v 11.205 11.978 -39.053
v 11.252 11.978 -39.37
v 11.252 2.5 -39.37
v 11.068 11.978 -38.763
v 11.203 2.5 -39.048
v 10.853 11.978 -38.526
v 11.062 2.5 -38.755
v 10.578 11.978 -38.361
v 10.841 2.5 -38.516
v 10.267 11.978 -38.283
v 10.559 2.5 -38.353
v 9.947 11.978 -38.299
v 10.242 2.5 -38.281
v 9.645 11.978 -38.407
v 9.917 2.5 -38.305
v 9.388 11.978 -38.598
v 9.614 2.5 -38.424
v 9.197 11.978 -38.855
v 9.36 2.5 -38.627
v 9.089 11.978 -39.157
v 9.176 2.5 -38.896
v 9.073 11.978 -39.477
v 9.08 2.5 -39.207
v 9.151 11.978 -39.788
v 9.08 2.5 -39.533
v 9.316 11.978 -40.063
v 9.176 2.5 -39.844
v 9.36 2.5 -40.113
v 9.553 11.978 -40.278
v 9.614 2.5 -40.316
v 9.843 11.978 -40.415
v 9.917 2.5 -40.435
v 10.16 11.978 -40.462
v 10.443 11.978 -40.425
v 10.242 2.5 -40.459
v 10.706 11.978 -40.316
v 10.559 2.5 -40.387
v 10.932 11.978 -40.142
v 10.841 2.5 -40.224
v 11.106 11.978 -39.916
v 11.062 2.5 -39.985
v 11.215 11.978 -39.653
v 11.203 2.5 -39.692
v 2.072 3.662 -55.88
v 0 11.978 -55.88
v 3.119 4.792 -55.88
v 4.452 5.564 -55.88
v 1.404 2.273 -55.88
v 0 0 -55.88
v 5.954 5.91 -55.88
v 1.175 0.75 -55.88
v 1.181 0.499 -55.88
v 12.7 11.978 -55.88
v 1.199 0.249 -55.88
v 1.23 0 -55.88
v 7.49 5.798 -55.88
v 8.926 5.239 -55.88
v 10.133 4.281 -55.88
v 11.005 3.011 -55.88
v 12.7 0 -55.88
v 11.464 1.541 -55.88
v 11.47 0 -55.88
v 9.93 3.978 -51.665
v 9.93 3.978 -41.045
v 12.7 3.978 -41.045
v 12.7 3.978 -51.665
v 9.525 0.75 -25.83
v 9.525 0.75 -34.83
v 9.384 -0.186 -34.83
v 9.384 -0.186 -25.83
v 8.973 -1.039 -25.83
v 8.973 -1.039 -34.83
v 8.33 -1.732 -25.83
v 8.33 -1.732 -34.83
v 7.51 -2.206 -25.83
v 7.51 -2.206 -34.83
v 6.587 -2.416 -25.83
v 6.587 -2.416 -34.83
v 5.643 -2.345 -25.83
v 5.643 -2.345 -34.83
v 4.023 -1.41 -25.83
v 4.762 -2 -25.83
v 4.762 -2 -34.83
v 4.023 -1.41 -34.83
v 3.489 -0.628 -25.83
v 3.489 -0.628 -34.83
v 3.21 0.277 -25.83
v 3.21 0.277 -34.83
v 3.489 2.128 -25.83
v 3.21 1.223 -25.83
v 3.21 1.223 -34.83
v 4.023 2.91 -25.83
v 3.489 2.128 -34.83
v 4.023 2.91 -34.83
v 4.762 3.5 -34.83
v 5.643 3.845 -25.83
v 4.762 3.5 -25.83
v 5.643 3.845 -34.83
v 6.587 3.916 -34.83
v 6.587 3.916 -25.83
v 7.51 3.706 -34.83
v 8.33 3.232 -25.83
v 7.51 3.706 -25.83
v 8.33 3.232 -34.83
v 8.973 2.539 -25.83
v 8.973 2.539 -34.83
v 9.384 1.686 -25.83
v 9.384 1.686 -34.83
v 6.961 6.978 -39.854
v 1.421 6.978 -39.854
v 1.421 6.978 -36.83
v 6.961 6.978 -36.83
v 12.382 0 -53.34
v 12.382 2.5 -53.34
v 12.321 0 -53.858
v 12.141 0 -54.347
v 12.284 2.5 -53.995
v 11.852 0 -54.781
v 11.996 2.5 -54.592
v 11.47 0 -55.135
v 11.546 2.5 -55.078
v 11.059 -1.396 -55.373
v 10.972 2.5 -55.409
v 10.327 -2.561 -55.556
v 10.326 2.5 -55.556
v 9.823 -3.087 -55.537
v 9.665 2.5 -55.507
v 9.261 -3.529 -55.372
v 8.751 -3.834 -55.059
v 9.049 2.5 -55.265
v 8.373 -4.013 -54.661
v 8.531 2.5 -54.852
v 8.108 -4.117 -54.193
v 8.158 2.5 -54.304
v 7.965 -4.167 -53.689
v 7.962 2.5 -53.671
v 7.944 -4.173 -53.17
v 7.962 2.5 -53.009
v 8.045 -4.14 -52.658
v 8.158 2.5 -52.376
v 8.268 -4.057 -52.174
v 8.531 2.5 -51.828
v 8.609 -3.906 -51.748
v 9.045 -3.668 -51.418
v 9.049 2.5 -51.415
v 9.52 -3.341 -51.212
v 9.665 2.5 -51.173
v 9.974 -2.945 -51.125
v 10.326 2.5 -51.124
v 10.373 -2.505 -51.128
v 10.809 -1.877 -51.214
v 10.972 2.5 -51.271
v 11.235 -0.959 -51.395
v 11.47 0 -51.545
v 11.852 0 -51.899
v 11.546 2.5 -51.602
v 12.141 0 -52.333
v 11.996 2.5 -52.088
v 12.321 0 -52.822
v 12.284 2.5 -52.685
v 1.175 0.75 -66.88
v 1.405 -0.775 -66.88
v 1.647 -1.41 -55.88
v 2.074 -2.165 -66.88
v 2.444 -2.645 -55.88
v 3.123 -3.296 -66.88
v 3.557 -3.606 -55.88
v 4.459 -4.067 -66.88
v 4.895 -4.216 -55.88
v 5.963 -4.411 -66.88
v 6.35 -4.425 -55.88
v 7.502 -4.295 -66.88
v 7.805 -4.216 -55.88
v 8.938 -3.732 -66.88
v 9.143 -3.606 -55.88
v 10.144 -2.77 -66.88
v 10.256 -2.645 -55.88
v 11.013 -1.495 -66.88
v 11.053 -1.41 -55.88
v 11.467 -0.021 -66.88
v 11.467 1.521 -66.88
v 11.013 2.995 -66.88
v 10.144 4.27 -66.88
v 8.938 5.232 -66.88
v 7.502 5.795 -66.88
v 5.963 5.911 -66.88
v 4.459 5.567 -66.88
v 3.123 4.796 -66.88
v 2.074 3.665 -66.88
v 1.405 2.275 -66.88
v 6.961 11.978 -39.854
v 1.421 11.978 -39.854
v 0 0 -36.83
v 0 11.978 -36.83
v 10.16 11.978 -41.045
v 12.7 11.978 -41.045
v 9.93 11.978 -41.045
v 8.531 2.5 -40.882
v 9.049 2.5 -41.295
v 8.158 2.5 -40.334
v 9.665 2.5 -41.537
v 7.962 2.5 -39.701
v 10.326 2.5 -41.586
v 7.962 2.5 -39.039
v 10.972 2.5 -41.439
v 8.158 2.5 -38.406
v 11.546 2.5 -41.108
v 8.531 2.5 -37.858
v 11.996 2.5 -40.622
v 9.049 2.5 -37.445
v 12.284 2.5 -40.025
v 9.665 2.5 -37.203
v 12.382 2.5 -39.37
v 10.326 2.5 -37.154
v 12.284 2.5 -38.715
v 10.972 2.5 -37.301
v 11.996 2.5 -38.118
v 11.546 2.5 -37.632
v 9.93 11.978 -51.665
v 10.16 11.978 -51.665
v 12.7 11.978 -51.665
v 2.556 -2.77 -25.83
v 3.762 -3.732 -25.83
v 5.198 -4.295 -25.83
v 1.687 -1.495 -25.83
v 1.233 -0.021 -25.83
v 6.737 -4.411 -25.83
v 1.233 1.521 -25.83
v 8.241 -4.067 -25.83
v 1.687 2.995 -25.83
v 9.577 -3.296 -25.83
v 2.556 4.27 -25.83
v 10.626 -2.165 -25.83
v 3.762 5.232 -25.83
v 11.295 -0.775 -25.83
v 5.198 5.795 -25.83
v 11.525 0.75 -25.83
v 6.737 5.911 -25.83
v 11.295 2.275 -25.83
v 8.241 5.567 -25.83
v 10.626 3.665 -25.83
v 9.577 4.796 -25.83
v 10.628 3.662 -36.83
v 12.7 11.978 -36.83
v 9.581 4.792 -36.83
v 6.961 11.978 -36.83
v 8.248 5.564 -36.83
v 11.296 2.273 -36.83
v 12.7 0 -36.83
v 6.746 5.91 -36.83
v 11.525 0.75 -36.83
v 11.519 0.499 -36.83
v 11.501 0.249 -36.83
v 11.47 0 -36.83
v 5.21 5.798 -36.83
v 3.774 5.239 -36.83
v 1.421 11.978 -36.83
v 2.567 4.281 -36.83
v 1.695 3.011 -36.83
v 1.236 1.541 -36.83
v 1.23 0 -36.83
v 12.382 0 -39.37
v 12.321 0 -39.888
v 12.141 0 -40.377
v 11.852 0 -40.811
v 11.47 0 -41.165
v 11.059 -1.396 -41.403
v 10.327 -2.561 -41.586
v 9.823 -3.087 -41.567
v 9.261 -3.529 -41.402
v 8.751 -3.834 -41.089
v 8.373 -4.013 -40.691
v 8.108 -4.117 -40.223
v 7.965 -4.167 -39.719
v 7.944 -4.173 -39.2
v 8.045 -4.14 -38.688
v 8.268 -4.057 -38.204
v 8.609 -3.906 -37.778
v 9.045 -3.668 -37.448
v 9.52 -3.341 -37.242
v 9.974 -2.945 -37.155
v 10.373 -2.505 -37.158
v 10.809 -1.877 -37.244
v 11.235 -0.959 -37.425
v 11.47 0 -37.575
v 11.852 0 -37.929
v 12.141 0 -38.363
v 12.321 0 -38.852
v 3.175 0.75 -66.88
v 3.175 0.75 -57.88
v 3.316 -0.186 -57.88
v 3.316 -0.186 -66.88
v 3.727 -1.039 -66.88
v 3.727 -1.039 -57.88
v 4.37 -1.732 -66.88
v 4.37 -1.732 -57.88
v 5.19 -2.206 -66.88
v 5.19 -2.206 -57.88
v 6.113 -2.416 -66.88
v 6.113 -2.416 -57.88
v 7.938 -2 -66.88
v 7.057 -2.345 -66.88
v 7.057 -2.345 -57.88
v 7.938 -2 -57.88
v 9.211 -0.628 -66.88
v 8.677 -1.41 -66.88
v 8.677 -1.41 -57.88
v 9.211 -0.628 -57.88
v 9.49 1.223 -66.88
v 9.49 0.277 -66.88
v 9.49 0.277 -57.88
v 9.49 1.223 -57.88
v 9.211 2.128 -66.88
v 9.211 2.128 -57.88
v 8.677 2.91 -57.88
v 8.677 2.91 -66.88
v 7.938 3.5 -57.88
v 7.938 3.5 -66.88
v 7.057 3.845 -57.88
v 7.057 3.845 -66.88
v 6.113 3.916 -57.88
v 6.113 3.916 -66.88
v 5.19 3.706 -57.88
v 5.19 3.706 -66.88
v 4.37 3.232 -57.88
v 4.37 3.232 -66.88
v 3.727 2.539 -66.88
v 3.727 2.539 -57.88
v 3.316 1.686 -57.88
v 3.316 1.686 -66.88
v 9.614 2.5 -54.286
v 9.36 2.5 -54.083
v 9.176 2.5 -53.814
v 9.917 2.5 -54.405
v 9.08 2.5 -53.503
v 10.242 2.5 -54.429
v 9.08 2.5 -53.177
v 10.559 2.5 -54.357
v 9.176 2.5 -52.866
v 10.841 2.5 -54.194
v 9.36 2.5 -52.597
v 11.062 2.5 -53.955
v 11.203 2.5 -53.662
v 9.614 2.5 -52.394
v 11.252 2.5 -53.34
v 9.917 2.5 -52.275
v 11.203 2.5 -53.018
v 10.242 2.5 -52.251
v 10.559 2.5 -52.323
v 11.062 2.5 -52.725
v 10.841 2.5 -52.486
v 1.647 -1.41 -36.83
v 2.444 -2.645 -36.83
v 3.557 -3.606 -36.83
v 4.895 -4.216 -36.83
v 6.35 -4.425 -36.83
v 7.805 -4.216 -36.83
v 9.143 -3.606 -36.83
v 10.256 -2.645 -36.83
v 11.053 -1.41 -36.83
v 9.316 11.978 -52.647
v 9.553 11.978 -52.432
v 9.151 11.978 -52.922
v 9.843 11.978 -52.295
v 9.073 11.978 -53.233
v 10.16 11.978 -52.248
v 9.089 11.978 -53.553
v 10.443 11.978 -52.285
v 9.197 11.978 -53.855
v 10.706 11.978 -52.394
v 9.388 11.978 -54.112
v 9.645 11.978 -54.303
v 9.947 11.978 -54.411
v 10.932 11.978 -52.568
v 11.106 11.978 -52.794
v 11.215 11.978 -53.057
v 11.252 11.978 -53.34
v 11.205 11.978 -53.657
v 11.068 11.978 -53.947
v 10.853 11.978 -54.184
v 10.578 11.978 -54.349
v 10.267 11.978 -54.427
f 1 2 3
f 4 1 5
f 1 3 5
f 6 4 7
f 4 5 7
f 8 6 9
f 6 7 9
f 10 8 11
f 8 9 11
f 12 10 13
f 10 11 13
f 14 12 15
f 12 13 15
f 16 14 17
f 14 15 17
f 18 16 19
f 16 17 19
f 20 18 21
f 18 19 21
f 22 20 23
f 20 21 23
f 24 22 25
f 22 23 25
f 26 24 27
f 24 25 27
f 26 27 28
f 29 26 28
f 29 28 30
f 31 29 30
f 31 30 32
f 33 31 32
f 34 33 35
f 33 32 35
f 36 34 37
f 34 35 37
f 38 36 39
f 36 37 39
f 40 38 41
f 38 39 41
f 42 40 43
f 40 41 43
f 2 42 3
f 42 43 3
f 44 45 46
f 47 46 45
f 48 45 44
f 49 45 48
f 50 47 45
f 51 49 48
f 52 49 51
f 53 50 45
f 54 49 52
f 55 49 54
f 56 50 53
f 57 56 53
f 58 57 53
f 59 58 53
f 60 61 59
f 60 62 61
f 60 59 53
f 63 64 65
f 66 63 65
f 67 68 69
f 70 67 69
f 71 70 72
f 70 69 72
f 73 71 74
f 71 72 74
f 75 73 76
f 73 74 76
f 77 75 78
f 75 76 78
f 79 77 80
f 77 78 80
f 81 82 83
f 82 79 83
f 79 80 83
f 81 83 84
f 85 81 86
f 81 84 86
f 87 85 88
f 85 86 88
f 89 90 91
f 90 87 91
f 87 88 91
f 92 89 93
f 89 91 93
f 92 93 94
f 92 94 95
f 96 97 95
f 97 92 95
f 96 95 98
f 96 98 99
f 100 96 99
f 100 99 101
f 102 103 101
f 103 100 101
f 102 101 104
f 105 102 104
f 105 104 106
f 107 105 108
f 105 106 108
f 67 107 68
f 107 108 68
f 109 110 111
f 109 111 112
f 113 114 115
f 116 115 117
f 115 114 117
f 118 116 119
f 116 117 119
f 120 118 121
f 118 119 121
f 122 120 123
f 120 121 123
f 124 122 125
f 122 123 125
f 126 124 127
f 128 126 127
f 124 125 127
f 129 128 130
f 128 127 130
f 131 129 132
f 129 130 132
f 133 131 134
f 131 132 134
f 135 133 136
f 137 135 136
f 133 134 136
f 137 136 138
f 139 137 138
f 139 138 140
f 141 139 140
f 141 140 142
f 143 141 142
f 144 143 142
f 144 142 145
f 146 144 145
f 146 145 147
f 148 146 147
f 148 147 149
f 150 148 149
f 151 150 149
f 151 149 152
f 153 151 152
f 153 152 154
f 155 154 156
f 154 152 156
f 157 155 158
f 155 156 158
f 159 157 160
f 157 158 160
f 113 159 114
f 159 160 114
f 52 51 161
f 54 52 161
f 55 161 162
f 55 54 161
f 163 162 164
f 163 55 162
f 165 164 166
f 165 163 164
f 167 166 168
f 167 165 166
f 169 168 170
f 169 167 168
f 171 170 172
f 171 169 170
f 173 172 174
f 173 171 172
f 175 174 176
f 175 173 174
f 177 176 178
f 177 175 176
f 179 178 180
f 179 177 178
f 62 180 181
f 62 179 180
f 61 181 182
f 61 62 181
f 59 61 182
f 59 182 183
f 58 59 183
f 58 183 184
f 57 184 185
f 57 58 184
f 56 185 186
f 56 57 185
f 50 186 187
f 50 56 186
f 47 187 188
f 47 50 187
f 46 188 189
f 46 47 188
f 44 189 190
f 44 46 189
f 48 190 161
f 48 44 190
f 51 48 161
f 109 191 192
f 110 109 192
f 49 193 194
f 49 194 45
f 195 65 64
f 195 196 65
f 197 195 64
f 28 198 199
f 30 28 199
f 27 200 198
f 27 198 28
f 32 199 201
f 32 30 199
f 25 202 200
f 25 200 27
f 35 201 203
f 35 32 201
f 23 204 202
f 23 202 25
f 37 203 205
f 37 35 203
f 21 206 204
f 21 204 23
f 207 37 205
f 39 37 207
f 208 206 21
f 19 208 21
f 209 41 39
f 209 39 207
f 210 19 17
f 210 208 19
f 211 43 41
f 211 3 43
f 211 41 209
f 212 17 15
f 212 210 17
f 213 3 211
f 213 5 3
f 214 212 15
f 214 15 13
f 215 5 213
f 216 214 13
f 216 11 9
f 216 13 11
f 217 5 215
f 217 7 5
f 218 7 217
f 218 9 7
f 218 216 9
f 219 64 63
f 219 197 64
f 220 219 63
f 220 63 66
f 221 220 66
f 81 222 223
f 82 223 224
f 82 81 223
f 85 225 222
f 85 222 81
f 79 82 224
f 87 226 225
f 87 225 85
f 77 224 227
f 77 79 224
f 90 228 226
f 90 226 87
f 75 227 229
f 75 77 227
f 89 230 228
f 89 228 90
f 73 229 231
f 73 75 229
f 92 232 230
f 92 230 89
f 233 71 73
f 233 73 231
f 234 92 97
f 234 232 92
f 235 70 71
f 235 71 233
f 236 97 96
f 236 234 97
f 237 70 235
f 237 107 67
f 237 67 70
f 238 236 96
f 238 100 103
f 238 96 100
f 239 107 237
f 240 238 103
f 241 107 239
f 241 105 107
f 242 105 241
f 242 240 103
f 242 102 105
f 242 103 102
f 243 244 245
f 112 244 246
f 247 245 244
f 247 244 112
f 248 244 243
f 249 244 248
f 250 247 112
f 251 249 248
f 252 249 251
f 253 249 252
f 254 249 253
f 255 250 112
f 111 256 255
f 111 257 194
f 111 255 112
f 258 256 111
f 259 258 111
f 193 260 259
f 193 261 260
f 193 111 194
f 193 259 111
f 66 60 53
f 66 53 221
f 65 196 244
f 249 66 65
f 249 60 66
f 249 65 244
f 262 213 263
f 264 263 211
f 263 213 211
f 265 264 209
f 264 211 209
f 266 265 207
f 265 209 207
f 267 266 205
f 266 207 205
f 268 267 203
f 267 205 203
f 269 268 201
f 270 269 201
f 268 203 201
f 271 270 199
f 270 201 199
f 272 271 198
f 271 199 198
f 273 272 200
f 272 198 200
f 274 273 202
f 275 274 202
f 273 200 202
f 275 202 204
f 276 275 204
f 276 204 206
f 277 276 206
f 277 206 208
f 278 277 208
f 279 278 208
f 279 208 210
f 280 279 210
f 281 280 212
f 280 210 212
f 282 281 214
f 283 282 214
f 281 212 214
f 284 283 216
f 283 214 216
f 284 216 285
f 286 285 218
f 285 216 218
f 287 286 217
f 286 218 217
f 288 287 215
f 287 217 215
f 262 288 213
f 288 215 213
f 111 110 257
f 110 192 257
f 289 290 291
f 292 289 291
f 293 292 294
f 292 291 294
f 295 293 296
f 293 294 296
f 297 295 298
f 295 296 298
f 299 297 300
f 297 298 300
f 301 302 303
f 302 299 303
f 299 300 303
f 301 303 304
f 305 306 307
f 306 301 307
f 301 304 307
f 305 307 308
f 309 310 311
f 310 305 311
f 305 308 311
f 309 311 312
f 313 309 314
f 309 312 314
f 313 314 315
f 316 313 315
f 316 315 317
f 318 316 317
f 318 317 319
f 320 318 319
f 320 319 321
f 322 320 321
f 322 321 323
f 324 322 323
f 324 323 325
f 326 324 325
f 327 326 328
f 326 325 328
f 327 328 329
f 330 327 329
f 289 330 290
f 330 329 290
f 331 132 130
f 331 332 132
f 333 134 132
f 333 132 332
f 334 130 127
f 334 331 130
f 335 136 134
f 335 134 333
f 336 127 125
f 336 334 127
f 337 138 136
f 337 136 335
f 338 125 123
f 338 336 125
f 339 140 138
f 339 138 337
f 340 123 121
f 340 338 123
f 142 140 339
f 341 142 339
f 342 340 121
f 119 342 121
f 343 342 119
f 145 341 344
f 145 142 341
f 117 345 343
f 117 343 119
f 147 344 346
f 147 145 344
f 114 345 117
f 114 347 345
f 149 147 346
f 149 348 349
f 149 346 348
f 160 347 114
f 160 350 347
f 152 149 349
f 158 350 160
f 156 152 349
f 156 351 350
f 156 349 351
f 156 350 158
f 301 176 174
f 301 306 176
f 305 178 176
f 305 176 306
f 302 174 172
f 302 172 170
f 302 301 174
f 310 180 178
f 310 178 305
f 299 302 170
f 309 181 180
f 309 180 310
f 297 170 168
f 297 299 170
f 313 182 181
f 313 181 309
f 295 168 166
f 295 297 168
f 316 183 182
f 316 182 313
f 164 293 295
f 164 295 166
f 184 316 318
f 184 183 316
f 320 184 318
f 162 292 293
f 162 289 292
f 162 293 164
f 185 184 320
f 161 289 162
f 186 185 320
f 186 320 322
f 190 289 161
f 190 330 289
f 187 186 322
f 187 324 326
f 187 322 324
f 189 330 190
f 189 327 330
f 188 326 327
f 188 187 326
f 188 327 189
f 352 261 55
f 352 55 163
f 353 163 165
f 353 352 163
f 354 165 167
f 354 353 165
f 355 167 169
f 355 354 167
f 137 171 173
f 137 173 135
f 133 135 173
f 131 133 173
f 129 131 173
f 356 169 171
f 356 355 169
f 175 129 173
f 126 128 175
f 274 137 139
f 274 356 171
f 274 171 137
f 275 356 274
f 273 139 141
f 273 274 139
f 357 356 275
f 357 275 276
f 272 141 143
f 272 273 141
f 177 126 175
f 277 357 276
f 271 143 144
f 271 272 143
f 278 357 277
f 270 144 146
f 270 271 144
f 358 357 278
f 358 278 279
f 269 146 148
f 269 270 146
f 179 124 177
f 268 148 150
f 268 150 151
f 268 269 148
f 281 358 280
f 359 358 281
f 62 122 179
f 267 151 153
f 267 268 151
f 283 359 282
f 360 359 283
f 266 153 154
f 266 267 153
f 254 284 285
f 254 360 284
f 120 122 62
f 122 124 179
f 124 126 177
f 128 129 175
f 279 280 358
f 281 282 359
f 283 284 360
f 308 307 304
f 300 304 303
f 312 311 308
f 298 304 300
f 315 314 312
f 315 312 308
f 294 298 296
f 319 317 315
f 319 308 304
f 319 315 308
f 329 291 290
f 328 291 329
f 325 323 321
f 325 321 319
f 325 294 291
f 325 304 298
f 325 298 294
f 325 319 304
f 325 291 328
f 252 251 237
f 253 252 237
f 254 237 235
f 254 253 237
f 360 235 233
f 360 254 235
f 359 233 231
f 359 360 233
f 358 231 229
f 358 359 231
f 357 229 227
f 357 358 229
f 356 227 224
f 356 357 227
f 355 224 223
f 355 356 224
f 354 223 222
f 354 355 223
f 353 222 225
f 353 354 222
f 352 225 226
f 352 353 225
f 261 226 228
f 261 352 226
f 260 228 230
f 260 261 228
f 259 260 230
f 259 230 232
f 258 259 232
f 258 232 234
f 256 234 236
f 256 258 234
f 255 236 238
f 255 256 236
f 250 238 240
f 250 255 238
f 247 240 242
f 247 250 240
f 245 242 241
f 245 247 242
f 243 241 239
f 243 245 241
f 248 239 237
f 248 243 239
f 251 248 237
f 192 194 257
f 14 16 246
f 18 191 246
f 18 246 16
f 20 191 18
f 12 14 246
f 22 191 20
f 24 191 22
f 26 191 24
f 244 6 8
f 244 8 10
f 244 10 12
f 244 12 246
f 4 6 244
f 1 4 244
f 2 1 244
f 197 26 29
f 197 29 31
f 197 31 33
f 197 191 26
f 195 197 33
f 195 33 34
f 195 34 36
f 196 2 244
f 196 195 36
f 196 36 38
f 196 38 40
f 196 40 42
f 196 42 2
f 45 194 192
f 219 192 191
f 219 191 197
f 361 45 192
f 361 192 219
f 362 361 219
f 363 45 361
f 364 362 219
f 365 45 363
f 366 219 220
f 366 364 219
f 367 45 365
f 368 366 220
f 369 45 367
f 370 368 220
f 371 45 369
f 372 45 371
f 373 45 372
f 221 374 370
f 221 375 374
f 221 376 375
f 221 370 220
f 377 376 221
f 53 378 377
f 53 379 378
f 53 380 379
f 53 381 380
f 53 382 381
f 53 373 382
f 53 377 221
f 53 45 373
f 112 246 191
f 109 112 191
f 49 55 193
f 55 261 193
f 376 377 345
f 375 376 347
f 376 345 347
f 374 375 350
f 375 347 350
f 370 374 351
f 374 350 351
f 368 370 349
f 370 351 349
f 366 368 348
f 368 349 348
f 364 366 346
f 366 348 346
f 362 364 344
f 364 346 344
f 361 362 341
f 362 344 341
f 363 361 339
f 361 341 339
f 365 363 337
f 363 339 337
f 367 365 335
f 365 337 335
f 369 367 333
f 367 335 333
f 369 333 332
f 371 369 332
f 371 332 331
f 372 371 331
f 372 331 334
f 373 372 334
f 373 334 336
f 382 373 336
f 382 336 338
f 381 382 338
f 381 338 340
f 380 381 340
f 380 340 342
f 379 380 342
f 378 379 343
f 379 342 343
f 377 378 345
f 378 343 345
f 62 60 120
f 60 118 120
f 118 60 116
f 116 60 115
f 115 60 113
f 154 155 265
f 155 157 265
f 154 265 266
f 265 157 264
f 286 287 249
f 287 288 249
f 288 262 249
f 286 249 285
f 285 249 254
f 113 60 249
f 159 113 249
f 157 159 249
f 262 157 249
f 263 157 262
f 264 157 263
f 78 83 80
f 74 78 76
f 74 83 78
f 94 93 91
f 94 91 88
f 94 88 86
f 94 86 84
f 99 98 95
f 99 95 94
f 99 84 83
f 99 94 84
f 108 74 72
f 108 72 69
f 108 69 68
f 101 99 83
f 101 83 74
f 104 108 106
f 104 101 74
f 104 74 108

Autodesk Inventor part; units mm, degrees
ref_plane "YZ Plane" through (0, 0, 0) normal (1, 0, 0) x (0, 1, 0)
ref_plane "XZ Plane" through (0, 0, 0) normal (0, 1, 0) x (-1, 0, 0)
ref_plane "XY Plane" through (0, 0, 0) normal (0, 0, 1) x (1, 0, 0)
sketch "Sketch1" plane through (0, 0, 0) normal (0, 1, 0) x (-1, 0, 0)
  line L0 (0, -55.88) -> (-12.7, -55.88)
  line L1 (-12.7, -36.83) -> (0, -36.83)
  line L2 (0, -36.83) -> (0, -55.88)
  line L3 (-12.7, -55.88) -> (-12.7, -36.83)
  dimension "d1" = 19.05
  dimension "d2" = 12.7
extrude "Extrusion1" add sketch "Sketch1" along normal blind 1.5
sketch "Sketch2" plane through (0, 1.5, 0) normal (0, 1, 0) x (1, 0, 0)
  line L0 (12.7, 36.83) -> (12.7, 55.88) projected
  line L1 (12.7, 0) -> (10.16, 0)
  circle A0 centre (10.16, 39.37) radius 1.092
  circle A1 centre (10.16, 53.34) radius 1.092
  line L2 (10.16, 53.34) -> (10.16, 39.37)
  point P0 (0, 0)
  dimension "d8" = 2.184
  dimension "d10" = 2.184
  dimension "d71" = 13.97
extrude "Extrusion2" cut sketch "Sketch2" against normal blind 1.5
sketch "Sketch5" plane through (0, 0, -36.83) normal (0, 0, 1) x (1, 0, 0)
  line L0 (12.7, 0) -> (0, 0) projected
  line L1 (6.35, 0) -> (6.35, 1.5)
  line L2 (12.7, 1.5) -> (0, 1.5) projected
  line L3 (0, 0) -> (0, 1.5) projected
  line L4 (0, 0.75) -> (12.7, 0.75)
  line L5 (12.7, 0) -> (12.7, 1.5) projected
  circle A0 centre (6.35, 0.75) radius 5.175
  dimension "d30" = 10.35
extrude "Extrusion5" add sketch "Sketch5" along normal blind 2 contours A0 L0 | L0 L1 L4 A0 | L0 A0 L4 L1 | L4 L1 L2 A0 | L4 A0 L2 L1 | L2 A0
sketch "Sketch6" plane through (6.35, 0.75, -34.83) normal (0, 0, 1) x (1, 0, 0)
  circle A0 centre (0, 0) radius 5.175
  circle A1 centre (0, 0) radius 3.175
  point P0 (-6.35, -0.75)
  dimension "d35" = 6.35
extrude "Extrusion6" add sketch "Sketch6" along normal blind 9
sketch "Sketch7" plane through (12.7, 0, -55.88) normal (0, 0, -1) x (-1, 0, 0)
  line L0 (0, 0) -> (0, 1.5) projected
  line L1 (0, 0.75) -> (12.7, 0.75)
  line L2 (12.7, 0) -> (12.7, 1.5) projected
  line L3 (11.4704, 1.5) -> (1.2296, 1.5) projected
  line L4 (6.35, 1.5) -> (6.35, 0)
  circle A0 centre (6.35, 0.75) radius 5.175
extrude "Extrusion7" add sketch "Sketch7" along normal blind 2
sketch "Sketch8" plane through (6.35, 0.75, -57.88) normal (0, 0, -1) x (-1, 0, 0)
  circle A0 centre (0, 0) radius 5.175
  circle A1 centre (0, 0) radius 3.175
  point P0 (6.35, -0.75)
  dimension "d40" = 6.35
extrude "Extrusion8" add sketch "Sketch8" along normal blind 9
thread "Thread1" size "1/4-20 UNC" class "2B" standard "ANSI Unified Screw Threads" full length
thread "Thread2" size "1/4-20 UNC" class "2B" standard "ANSI Unified Screw Threads" full length
sketch "Sketch9" plane through (0, 0, -36.83) normal (0, 0, -1) x (-1, 0, 0)
  arc A0 (-11.4704, 0) -> (-1.2296, 0) centre (-6.35, 0.75) ccw projected
  line L0 (0, 0) -> (-1.2296, 0) projected
  line L1 (-11.4704, 0) -> (-1.2296, 0)
  circle A1 centre (-6.35, 0.75) radius 5.175
extrude "Extrusion9" add sketch "Sketch9" along normal up to next contours L1 A0
sketch "Sketch10" plane through (10.16, 0, -39.37) normal (0, 1, 0) x (1, 0, 0)
  circle A0 centre (0, 0) radius 1.092
  circle A1 centre (0, 13.97) radius 1.092 projected
  circle A2 centre (0, 13.97) radius 1.092
  point P0 (-10.16, -39.37)
  dimension "d60" = 2.184
extrude "Extrusion10" cut sketch "Sketch10" against normal up to next
sketch "Sketch12" plane through (0, 1.5, 0) normal (0, 1, 0) x (1, 0, 0)
  circle A0 centre (10.16, 39.37) radius 1.092 projected
  circle A1 centre (10.16, 39.37) radius 1.092
  circle A2 centre (10.16, 39.37) radius 2.2225
  circle A3 centre (10.16, 53.34) radius 1.092 projected
  circle A4 centre (10.16, 53.34) radius 1.092
  circle A5 centre (10.16, 53.34) radius 2.2225
  point P0 (0, 0)
  dimension "d54" = 4.445
  dimension "d55" = 4.445
extrude "Extrusion11" cut sketch "Sketch12" against normal blind 5.925
sketch "Sketch13" plane through (0, 1.5, 0) normal (0, 1, 0) x (1, 0, 0)
  line L0 (12.7, 36.83) -> (12.7, 55.88) projected
  line L1 (12.7, 55.88) -> (0, 55.88)
  line L2 (0, 55.88) -> (0, 36.83)
  line L3 (12.7, 36.83) -> (12.7, 55.88)
  circle A0 centre (10.16, 53.34) radius 1.092 projected
  circle A1 centre (10.16, 53.34) radius 1.092
  line L4 (10.16, 53.34) -> (10.16, 39.37)
  circle A2 centre (10.16, 39.37) radius 1.092
  line L5 (0, 36.83) -> (12.7, 36.83)
  point P0 (0, 0)
  point P1 (12.7, 0)
  dimension "d72" = 13.97
  dimension "d73" = 2.184
extrude "Extrusion12" add sketch "Sketch13" along normal blind 10.4775 contours L5 L2 L1 L0 | A2
thread "Thread6" size "2-56 UNC" class "2B" standard "ANSI Unified Screw Threads" full length
sketch "Sketch14" plane through (10.16, 1.5, -53.34) normal (0, -1, 0) x (1, 0, 0)
  circle A0 centre (0, 0) radius 1.092 projected
  circle A1 centre (0, 0) radius 2.2225
  circle A2 centre (0, 13.97) radius 2.2225 projected
  circle A3 centre (0, 13.97) radius 2.2225
  circle A4 centre (0, 0) radius 1.092
  circle A5 centre (0, 13.97) radius 1.092
  point P0 (-10.16, 53.34)
extrude "Extrusion13" cut sketch "Sketch14" against normal blind 1
sketch "Sketch15" plane through (10.16, 1.5, -39.37) normal (0, -1, 0) x (1, 0, 0)
  circle A0 centre (0, 0) radius 1.092
  point P0 (-10.16, 39.37)
extrude "Extrusion14" cut sketch "Sketch15" against normal through all
thread "Thread7" size "2-56 UNC" class "2B" standard "ANSI Unified Screw Threads" full length
sketch "Sketch16" plane through (0, 11.9775, 0) normal (0, 1, 0) x (1, 0, 0)
  line L0 (11.525, 36.83) -> (1.175, 36.83) projected
  line L1 (3.175, 34.83) -> (9.525, 34.83) projected
  line L2 (1.921, 36.83) -> (6.461, 36.83)
  line L3 (6.461, 36.83) -> (6.961, 36.83)
  line L4 (6.961, 36.83) -> (6.961, 39.854)
  line L5 (6.961, 39.854) -> (1.421, 39.854)
  line L6 (1.421, 39.854) -> (1.421, 36.83)
  line L7 (1.421, 36.83) -> (1.921, 36.83)
  point P0 (0, 0)
  point P1 (0, 36.83)
  point P2 (1.2296, 36.83)
  point P3 (11.4704, 36.83)
  dimension "d114" = 0.5
  dimension "d115" = 3.024
  dimension "d116" = 5.54
extrude "Extrusion15" cut sketch "Sketch16" against normal blind 5
sketch "Sketch17" plane through (0, 11.9775, 0) normal (0, 1, 0) x (1, 0, 0)
  line L0 (12.7, 36.83) -> (12.7, 55.88) projected
  line L1 (12.7, 55.88) -> (0, 55.88) projected
  line L2 (0, 36.83) -> (12.7, 36.83) projected
  line L3 (0, 36.83) -> (12.7, 36.83)
  line L4 (12.7, 36.83) -> (12.7, 55.88)
  line L5 (12.7, 55.88) -> (0, 55.88)
  line L6 (0, 55.88) -> (0, 36.83)
  line L7 (11.4704, 41.1651) -> (11.4704, 51.5449) projected
  line L8 (11.43, 42.545) -> (12.43, 42.545) construction
  line L9 (11.43, 50.165) -> (12.43, 50.165) construction
  line L10 (12.7, 41.545) -> (12.7, 51.165)
  line L11 (12.7, 41.545) -> (12.7, 41.045)
  line L12 (12.7, 41.045) -> (9.93, 41.045)
  line L13 (9.93, 41.045) -> (9.93, 51.665)
  line L14 (9.93, 51.665) -> (12.7, 51.665)
  line L15 (12.7, 51.165) -> (12.7, 51.665)
  point P0 (0, 0)
  dimension "d110" = 2.77
  dimension "d111" = 10.62
  dimension "d112" = 90
extrude "Extrusion16" cut sketch "Sketch17" against normal blind 8 contours L12 L13 L14 L0
properties part number "Line Sensor 6 Bracket"
